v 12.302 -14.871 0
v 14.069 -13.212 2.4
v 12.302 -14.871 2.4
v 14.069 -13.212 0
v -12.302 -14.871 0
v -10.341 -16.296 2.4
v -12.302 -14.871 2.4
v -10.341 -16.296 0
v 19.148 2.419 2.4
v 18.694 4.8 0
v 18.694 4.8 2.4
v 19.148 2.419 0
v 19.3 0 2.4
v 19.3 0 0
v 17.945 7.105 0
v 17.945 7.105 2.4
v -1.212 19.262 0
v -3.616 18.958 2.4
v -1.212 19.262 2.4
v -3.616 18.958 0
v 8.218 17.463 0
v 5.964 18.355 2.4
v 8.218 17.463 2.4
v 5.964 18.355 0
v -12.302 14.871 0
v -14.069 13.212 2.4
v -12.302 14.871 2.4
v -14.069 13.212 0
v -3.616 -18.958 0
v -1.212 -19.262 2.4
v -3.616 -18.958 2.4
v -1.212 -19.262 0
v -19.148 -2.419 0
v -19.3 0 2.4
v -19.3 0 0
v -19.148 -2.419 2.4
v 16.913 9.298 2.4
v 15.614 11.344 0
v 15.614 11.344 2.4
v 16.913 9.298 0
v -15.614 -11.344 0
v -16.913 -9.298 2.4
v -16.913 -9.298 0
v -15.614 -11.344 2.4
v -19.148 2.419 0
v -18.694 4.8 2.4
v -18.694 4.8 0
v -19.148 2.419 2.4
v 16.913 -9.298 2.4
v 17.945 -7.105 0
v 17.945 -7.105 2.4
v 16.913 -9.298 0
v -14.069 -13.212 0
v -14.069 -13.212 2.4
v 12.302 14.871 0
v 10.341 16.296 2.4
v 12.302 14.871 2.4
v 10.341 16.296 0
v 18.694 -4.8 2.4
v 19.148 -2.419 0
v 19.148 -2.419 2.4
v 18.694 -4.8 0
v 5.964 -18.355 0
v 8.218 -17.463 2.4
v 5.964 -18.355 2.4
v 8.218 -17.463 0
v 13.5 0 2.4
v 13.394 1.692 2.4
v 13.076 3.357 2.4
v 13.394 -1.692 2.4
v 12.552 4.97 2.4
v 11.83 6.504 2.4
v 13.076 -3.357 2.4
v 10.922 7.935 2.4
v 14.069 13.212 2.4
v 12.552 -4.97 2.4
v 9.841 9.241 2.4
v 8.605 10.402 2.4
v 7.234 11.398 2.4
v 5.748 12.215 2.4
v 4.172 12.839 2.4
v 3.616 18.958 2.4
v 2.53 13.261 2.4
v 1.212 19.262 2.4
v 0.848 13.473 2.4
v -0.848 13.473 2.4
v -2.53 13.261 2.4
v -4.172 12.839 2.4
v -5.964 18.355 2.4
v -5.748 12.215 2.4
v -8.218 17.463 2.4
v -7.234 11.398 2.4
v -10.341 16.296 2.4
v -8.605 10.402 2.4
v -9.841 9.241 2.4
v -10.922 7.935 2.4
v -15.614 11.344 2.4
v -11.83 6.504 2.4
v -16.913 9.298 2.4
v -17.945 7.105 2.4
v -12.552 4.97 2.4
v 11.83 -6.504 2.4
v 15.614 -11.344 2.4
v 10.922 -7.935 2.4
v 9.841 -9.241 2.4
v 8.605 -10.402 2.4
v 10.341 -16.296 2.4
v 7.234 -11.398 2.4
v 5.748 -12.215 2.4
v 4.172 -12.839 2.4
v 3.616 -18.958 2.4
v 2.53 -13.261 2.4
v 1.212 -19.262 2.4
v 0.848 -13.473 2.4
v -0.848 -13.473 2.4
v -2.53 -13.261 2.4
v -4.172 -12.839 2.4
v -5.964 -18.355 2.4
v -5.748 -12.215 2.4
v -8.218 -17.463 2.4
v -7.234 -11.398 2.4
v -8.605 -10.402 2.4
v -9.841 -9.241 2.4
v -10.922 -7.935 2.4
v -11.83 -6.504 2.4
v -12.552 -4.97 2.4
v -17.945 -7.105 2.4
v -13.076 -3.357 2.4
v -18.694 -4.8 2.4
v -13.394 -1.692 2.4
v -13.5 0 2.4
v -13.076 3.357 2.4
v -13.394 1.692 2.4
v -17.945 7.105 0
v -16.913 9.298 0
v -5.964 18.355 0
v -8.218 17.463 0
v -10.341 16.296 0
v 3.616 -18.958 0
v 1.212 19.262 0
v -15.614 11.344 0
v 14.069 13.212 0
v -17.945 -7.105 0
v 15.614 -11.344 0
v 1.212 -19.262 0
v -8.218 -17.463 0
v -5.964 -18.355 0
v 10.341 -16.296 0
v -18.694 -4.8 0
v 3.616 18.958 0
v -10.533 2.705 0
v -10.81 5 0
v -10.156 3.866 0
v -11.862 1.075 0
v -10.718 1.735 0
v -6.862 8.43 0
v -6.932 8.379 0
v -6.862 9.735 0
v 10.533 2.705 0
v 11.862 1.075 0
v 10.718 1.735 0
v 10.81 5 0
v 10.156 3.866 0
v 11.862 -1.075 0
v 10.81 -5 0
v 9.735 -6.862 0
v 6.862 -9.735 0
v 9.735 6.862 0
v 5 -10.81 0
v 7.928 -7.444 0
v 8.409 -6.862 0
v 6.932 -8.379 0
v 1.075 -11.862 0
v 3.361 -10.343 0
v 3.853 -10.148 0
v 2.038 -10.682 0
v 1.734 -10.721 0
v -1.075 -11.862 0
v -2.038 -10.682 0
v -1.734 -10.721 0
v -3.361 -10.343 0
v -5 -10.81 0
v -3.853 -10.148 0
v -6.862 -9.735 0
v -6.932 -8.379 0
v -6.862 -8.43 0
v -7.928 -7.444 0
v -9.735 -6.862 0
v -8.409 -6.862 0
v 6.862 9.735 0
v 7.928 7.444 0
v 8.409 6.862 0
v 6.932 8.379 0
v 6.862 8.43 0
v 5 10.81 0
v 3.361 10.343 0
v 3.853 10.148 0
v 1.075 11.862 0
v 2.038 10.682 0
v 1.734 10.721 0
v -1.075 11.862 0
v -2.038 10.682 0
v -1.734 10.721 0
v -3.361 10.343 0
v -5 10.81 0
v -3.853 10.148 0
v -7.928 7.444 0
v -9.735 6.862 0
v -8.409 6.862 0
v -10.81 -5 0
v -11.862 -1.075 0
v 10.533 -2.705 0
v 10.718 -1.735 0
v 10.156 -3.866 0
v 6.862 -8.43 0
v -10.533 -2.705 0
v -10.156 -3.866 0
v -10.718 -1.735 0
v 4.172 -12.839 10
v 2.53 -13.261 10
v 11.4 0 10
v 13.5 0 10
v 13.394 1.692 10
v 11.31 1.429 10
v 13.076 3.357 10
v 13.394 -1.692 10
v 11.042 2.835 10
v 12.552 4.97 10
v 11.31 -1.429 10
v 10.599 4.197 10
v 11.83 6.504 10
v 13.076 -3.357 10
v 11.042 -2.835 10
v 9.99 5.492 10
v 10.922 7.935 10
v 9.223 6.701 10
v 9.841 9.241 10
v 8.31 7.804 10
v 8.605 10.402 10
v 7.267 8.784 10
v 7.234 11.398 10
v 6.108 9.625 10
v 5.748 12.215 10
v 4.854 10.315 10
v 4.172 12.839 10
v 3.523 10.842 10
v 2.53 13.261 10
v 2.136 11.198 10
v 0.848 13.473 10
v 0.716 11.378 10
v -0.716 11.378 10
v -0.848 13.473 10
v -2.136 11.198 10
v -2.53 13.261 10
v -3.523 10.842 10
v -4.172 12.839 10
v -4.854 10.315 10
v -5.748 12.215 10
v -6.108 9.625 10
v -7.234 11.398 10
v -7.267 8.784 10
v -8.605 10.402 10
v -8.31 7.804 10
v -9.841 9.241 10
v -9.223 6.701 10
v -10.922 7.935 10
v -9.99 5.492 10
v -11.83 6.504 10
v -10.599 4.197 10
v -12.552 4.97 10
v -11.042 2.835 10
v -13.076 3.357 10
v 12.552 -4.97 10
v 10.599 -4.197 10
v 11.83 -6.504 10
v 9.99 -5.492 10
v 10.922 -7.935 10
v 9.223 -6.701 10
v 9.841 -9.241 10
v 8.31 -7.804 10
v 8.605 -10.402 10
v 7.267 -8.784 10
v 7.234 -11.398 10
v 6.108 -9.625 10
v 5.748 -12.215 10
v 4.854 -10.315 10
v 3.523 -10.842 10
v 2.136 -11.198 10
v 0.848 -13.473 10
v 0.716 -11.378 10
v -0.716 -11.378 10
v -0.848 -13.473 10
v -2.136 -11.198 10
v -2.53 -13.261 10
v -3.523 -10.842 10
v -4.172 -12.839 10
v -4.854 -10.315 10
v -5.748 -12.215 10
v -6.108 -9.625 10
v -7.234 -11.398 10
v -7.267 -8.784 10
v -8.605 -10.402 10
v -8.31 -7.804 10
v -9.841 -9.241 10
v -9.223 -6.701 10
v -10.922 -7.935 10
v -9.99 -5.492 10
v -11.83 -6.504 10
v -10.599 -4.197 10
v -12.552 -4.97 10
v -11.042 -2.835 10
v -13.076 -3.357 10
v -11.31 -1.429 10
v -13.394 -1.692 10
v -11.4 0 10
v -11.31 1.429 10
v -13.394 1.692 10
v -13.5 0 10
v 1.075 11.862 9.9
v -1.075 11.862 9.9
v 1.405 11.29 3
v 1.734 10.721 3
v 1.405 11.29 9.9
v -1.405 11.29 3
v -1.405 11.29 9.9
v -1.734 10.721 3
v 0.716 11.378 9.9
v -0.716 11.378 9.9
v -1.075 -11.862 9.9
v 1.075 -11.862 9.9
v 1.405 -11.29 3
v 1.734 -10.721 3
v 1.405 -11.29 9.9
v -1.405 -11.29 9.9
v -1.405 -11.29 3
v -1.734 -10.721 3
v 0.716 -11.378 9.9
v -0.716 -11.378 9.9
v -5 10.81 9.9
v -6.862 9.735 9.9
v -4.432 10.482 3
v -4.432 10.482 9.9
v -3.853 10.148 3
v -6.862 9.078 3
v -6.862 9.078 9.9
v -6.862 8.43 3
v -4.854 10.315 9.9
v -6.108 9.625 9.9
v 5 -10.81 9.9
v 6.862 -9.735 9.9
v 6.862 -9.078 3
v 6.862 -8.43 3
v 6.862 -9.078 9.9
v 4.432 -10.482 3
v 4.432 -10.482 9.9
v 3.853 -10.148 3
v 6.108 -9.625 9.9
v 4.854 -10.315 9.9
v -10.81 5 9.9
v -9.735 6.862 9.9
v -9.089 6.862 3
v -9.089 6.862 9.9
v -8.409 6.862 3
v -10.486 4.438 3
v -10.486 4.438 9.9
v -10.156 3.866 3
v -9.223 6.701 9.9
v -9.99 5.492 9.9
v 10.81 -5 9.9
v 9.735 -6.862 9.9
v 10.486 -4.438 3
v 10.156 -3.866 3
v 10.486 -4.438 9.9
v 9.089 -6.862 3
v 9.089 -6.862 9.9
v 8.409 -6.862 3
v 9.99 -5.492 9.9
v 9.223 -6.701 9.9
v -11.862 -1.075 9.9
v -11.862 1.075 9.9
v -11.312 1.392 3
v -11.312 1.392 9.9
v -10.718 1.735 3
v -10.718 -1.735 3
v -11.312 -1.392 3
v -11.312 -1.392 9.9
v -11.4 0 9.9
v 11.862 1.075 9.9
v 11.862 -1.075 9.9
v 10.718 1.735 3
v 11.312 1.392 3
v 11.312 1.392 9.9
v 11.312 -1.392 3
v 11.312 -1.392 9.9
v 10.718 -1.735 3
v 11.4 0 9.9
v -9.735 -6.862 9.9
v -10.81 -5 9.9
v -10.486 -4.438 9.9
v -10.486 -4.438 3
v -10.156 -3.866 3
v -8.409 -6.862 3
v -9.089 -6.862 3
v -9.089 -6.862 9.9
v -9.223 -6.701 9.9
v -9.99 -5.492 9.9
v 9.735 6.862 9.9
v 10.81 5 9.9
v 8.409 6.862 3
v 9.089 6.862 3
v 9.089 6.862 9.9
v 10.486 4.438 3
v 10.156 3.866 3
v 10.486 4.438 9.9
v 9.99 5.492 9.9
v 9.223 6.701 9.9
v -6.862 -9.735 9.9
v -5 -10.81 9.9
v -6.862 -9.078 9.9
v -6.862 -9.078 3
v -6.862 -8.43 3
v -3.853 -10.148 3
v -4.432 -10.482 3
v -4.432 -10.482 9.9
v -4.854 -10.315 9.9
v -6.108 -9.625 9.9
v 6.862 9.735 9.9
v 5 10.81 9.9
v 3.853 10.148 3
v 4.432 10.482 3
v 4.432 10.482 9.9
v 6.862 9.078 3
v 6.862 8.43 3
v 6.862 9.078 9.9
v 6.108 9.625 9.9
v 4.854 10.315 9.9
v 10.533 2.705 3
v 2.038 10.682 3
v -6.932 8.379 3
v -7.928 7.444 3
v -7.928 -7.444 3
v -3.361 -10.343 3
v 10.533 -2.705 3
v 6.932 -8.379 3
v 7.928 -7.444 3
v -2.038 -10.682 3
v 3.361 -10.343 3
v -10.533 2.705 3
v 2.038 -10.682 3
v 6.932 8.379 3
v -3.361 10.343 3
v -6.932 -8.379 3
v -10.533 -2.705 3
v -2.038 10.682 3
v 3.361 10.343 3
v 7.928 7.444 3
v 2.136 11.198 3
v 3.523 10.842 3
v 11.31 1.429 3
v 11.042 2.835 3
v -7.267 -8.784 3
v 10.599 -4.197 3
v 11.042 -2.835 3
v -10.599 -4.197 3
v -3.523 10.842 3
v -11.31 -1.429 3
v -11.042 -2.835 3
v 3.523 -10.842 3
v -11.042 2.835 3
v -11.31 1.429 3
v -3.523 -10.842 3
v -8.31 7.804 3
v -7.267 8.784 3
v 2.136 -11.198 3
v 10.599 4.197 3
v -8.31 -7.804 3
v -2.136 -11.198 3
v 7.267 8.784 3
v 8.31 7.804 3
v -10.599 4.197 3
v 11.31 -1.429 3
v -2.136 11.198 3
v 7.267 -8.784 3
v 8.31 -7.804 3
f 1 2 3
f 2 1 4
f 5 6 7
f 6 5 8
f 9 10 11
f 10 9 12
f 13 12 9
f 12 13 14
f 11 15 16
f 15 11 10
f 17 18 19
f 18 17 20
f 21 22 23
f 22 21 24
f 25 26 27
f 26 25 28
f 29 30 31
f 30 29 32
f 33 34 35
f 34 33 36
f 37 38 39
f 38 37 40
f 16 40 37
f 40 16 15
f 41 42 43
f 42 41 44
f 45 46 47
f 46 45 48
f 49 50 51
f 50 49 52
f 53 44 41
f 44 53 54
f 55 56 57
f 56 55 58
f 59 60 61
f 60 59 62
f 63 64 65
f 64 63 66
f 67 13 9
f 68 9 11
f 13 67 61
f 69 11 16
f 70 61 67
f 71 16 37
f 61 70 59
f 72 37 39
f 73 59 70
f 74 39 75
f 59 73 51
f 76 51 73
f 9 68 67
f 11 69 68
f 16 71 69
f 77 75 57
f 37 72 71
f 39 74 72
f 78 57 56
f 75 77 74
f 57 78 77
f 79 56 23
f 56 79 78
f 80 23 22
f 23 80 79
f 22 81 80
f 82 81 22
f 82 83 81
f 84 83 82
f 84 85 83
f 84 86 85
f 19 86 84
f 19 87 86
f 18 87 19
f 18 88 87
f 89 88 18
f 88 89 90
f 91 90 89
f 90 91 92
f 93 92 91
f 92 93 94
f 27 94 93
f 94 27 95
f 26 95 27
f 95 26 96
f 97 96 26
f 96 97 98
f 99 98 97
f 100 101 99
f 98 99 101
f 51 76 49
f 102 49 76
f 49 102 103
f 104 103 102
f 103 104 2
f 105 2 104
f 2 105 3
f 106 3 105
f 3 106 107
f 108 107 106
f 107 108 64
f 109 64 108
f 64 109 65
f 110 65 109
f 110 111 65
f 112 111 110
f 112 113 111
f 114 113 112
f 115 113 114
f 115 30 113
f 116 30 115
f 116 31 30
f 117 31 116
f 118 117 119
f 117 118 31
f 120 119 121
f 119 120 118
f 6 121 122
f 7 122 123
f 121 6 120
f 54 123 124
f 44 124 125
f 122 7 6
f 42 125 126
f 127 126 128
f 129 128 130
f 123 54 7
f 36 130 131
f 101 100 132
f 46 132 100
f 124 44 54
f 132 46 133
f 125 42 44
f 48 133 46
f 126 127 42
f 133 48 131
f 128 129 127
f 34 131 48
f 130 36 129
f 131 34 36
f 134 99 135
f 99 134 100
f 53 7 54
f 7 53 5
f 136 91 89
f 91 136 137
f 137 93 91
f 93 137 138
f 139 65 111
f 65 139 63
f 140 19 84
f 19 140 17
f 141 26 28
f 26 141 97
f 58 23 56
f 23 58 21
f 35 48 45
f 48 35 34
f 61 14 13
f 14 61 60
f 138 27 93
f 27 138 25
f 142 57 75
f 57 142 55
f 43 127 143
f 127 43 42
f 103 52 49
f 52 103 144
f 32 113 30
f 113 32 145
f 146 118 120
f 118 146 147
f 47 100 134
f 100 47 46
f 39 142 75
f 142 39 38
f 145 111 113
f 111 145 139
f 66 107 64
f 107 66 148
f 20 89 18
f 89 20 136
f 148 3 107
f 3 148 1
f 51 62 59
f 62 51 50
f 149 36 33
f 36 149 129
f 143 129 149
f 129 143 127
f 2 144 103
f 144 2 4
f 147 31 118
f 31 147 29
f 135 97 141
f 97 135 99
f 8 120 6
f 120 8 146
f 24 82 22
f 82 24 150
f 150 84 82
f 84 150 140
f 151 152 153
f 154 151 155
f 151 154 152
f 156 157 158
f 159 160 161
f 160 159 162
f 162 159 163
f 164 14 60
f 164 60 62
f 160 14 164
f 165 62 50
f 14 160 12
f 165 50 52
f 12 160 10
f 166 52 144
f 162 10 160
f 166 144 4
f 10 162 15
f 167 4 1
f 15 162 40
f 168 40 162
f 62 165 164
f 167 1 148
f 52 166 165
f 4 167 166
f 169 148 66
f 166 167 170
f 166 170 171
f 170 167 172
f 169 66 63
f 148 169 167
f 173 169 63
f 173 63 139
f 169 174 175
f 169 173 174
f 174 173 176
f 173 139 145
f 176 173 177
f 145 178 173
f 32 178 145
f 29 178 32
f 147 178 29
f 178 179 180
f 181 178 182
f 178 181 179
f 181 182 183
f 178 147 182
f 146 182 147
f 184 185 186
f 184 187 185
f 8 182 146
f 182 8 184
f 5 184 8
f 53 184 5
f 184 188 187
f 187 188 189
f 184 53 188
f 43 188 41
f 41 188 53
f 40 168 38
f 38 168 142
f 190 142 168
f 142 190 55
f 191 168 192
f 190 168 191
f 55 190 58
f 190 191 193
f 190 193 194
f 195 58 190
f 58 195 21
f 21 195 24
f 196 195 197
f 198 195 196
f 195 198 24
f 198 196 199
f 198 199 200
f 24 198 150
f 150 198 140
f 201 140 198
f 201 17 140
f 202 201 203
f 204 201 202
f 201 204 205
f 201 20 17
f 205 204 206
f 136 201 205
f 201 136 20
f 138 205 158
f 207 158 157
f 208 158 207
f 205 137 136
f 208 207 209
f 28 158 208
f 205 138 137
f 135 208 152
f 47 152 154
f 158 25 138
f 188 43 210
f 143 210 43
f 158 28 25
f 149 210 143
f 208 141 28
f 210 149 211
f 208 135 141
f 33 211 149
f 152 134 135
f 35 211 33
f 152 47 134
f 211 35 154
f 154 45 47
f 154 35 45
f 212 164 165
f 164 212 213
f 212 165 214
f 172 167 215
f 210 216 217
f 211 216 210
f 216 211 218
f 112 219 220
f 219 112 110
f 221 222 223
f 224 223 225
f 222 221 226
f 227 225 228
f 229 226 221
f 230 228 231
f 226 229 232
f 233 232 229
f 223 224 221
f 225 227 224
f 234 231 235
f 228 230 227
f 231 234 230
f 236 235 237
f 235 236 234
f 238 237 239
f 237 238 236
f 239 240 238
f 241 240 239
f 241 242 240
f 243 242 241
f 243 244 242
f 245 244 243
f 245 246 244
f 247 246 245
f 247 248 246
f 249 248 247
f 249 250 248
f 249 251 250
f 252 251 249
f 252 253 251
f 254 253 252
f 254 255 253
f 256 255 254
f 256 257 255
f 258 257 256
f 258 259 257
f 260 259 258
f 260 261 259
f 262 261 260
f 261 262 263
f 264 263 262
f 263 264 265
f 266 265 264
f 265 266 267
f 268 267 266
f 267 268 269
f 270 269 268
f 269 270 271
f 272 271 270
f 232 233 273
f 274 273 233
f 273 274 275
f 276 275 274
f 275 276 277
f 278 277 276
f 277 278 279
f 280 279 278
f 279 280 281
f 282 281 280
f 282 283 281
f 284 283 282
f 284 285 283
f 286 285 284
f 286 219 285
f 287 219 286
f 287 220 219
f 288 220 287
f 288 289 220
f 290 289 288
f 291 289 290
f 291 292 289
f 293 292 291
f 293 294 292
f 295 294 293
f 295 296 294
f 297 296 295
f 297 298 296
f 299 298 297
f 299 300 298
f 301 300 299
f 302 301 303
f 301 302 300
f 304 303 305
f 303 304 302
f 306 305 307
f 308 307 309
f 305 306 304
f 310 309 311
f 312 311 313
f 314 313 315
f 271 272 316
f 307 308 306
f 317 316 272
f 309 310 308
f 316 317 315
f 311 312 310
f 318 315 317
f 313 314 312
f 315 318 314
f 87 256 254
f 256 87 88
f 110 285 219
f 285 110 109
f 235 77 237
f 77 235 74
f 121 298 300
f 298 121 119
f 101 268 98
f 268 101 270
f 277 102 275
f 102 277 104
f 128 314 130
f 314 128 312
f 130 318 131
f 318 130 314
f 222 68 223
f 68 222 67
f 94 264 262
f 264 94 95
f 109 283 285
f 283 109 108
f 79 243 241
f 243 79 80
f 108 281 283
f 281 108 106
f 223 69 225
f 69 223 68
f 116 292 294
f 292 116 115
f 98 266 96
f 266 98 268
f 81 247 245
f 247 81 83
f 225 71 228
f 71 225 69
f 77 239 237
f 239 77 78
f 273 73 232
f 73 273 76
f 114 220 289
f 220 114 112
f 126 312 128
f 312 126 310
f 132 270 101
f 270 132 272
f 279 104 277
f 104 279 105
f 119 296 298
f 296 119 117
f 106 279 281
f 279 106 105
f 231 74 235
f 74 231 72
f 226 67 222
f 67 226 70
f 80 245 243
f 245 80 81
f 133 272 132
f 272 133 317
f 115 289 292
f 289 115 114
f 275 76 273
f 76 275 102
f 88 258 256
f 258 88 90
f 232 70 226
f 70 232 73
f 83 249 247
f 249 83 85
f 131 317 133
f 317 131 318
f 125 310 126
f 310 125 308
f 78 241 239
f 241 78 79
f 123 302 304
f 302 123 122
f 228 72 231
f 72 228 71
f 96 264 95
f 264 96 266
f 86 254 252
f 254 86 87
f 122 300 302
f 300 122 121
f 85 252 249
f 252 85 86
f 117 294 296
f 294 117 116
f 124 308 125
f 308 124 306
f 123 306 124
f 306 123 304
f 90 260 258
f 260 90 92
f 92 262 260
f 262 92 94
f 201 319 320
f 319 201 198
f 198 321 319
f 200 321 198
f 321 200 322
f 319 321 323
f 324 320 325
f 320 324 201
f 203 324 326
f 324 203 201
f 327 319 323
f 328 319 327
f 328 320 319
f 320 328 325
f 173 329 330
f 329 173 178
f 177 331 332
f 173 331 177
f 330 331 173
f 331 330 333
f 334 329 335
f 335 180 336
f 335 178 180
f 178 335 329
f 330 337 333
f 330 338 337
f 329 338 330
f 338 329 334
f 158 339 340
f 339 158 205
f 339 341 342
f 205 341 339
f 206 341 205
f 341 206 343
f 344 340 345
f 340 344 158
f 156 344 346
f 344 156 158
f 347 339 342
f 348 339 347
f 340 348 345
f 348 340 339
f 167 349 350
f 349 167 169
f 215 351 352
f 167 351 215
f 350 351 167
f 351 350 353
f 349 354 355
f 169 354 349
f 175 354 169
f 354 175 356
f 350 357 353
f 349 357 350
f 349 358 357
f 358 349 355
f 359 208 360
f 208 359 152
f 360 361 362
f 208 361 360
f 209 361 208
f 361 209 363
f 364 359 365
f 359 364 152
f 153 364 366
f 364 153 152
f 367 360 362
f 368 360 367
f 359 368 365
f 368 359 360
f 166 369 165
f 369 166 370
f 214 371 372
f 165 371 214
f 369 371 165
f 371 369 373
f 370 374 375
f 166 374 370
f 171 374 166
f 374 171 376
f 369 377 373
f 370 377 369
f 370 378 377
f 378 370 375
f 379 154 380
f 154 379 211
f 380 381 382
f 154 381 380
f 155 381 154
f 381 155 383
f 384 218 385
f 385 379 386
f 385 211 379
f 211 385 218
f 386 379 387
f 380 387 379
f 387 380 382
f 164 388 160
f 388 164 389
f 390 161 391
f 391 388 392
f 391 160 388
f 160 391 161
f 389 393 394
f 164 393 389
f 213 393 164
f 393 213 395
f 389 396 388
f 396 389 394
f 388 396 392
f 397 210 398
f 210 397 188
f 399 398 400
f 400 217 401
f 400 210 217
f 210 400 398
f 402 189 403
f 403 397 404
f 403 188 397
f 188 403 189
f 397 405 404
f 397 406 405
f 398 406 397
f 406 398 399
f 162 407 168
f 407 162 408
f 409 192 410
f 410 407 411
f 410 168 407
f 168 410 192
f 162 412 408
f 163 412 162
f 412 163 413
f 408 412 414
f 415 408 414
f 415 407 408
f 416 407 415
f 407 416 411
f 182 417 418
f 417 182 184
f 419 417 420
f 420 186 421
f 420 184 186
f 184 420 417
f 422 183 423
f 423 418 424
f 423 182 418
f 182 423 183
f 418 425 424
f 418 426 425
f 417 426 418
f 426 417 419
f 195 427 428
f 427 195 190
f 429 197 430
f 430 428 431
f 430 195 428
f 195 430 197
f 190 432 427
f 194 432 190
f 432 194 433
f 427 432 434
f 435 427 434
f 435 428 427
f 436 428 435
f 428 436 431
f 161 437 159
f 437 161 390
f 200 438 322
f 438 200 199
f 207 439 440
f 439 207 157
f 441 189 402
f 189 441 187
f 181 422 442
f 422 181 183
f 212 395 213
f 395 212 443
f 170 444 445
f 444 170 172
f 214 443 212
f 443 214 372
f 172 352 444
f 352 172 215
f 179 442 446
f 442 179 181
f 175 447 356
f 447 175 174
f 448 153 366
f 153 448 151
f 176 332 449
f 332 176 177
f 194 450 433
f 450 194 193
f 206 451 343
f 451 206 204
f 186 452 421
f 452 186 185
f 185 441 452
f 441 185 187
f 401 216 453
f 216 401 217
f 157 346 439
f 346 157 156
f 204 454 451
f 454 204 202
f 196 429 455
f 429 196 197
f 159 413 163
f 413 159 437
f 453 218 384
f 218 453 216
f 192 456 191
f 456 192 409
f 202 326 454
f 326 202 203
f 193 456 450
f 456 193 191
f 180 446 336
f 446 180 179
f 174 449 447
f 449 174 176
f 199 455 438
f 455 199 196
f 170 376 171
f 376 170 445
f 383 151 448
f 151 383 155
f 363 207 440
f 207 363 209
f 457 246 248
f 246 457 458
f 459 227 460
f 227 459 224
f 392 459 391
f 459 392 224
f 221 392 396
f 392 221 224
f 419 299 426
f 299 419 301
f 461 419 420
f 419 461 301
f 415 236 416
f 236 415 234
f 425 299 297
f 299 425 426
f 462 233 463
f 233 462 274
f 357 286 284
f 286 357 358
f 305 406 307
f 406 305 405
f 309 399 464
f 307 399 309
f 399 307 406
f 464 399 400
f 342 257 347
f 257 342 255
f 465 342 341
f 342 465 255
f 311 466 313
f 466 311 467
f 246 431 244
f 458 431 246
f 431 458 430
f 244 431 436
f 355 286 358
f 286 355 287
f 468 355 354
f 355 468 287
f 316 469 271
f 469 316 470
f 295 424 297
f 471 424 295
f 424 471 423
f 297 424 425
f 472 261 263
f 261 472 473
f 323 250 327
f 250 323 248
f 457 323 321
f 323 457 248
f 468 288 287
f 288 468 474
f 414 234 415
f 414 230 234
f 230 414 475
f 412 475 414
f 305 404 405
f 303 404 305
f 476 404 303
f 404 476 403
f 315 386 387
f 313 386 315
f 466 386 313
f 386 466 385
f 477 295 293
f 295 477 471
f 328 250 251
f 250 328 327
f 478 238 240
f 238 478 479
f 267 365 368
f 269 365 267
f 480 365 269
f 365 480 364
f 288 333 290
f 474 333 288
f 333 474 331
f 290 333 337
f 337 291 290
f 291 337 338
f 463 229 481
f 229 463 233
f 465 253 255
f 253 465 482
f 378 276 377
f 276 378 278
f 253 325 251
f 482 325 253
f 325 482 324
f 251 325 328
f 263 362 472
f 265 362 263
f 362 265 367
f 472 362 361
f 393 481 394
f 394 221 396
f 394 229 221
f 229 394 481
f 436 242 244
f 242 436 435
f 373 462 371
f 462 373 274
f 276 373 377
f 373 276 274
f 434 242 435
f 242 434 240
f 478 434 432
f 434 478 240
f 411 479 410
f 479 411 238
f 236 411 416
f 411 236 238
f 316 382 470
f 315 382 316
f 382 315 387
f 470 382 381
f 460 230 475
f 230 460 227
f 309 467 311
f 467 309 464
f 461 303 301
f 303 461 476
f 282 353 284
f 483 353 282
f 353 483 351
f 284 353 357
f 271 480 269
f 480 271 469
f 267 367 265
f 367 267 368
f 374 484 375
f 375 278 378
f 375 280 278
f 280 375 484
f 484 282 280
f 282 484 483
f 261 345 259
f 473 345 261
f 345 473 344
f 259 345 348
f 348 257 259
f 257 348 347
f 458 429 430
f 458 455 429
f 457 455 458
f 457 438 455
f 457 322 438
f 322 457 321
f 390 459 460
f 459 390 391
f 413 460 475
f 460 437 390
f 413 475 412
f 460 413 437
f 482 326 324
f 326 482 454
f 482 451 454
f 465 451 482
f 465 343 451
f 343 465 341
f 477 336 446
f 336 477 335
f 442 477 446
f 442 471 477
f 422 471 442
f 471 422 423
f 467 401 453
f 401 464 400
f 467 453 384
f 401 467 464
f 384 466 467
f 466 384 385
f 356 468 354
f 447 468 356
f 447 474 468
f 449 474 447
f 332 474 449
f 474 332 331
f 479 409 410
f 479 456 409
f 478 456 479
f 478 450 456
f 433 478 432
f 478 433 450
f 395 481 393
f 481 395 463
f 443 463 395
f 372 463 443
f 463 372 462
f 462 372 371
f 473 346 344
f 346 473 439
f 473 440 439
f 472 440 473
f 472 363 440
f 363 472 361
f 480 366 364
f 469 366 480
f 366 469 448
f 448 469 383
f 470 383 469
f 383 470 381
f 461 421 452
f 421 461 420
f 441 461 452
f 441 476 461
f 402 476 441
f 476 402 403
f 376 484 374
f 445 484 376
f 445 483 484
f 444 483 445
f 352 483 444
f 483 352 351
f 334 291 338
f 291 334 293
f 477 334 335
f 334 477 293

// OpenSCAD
$fn=50;

module hexagonal_cut()
{
	translate([0,10,-0.1]) cylinder(h=10, d=4.3, $fn=6);
	translate([0,-10,-0.1]) cylinder(h=10, d=4.3, $fn=6);
}

difference()
{
	union()
	{
		cylinder(h=2.4, d=38.6);
		cylinder(h=10, d=27);
	}
	translate([0,0,-0.01])cylinder(h=10, d=21.75);
	translate([0,0,3])cylinder(h=10, d=22.8);
	hexagonal_cut();
	rotate([0,0,30]) hexagonal_cut();
	rotate([0,0,60]) hexagonal_cut();
	rotate([0,0,90]) hexagonal_cut();
	rotate([0,0,120]) hexagonal_cut();
	rotate([0,0,150]) hexagonal_cut();
}
